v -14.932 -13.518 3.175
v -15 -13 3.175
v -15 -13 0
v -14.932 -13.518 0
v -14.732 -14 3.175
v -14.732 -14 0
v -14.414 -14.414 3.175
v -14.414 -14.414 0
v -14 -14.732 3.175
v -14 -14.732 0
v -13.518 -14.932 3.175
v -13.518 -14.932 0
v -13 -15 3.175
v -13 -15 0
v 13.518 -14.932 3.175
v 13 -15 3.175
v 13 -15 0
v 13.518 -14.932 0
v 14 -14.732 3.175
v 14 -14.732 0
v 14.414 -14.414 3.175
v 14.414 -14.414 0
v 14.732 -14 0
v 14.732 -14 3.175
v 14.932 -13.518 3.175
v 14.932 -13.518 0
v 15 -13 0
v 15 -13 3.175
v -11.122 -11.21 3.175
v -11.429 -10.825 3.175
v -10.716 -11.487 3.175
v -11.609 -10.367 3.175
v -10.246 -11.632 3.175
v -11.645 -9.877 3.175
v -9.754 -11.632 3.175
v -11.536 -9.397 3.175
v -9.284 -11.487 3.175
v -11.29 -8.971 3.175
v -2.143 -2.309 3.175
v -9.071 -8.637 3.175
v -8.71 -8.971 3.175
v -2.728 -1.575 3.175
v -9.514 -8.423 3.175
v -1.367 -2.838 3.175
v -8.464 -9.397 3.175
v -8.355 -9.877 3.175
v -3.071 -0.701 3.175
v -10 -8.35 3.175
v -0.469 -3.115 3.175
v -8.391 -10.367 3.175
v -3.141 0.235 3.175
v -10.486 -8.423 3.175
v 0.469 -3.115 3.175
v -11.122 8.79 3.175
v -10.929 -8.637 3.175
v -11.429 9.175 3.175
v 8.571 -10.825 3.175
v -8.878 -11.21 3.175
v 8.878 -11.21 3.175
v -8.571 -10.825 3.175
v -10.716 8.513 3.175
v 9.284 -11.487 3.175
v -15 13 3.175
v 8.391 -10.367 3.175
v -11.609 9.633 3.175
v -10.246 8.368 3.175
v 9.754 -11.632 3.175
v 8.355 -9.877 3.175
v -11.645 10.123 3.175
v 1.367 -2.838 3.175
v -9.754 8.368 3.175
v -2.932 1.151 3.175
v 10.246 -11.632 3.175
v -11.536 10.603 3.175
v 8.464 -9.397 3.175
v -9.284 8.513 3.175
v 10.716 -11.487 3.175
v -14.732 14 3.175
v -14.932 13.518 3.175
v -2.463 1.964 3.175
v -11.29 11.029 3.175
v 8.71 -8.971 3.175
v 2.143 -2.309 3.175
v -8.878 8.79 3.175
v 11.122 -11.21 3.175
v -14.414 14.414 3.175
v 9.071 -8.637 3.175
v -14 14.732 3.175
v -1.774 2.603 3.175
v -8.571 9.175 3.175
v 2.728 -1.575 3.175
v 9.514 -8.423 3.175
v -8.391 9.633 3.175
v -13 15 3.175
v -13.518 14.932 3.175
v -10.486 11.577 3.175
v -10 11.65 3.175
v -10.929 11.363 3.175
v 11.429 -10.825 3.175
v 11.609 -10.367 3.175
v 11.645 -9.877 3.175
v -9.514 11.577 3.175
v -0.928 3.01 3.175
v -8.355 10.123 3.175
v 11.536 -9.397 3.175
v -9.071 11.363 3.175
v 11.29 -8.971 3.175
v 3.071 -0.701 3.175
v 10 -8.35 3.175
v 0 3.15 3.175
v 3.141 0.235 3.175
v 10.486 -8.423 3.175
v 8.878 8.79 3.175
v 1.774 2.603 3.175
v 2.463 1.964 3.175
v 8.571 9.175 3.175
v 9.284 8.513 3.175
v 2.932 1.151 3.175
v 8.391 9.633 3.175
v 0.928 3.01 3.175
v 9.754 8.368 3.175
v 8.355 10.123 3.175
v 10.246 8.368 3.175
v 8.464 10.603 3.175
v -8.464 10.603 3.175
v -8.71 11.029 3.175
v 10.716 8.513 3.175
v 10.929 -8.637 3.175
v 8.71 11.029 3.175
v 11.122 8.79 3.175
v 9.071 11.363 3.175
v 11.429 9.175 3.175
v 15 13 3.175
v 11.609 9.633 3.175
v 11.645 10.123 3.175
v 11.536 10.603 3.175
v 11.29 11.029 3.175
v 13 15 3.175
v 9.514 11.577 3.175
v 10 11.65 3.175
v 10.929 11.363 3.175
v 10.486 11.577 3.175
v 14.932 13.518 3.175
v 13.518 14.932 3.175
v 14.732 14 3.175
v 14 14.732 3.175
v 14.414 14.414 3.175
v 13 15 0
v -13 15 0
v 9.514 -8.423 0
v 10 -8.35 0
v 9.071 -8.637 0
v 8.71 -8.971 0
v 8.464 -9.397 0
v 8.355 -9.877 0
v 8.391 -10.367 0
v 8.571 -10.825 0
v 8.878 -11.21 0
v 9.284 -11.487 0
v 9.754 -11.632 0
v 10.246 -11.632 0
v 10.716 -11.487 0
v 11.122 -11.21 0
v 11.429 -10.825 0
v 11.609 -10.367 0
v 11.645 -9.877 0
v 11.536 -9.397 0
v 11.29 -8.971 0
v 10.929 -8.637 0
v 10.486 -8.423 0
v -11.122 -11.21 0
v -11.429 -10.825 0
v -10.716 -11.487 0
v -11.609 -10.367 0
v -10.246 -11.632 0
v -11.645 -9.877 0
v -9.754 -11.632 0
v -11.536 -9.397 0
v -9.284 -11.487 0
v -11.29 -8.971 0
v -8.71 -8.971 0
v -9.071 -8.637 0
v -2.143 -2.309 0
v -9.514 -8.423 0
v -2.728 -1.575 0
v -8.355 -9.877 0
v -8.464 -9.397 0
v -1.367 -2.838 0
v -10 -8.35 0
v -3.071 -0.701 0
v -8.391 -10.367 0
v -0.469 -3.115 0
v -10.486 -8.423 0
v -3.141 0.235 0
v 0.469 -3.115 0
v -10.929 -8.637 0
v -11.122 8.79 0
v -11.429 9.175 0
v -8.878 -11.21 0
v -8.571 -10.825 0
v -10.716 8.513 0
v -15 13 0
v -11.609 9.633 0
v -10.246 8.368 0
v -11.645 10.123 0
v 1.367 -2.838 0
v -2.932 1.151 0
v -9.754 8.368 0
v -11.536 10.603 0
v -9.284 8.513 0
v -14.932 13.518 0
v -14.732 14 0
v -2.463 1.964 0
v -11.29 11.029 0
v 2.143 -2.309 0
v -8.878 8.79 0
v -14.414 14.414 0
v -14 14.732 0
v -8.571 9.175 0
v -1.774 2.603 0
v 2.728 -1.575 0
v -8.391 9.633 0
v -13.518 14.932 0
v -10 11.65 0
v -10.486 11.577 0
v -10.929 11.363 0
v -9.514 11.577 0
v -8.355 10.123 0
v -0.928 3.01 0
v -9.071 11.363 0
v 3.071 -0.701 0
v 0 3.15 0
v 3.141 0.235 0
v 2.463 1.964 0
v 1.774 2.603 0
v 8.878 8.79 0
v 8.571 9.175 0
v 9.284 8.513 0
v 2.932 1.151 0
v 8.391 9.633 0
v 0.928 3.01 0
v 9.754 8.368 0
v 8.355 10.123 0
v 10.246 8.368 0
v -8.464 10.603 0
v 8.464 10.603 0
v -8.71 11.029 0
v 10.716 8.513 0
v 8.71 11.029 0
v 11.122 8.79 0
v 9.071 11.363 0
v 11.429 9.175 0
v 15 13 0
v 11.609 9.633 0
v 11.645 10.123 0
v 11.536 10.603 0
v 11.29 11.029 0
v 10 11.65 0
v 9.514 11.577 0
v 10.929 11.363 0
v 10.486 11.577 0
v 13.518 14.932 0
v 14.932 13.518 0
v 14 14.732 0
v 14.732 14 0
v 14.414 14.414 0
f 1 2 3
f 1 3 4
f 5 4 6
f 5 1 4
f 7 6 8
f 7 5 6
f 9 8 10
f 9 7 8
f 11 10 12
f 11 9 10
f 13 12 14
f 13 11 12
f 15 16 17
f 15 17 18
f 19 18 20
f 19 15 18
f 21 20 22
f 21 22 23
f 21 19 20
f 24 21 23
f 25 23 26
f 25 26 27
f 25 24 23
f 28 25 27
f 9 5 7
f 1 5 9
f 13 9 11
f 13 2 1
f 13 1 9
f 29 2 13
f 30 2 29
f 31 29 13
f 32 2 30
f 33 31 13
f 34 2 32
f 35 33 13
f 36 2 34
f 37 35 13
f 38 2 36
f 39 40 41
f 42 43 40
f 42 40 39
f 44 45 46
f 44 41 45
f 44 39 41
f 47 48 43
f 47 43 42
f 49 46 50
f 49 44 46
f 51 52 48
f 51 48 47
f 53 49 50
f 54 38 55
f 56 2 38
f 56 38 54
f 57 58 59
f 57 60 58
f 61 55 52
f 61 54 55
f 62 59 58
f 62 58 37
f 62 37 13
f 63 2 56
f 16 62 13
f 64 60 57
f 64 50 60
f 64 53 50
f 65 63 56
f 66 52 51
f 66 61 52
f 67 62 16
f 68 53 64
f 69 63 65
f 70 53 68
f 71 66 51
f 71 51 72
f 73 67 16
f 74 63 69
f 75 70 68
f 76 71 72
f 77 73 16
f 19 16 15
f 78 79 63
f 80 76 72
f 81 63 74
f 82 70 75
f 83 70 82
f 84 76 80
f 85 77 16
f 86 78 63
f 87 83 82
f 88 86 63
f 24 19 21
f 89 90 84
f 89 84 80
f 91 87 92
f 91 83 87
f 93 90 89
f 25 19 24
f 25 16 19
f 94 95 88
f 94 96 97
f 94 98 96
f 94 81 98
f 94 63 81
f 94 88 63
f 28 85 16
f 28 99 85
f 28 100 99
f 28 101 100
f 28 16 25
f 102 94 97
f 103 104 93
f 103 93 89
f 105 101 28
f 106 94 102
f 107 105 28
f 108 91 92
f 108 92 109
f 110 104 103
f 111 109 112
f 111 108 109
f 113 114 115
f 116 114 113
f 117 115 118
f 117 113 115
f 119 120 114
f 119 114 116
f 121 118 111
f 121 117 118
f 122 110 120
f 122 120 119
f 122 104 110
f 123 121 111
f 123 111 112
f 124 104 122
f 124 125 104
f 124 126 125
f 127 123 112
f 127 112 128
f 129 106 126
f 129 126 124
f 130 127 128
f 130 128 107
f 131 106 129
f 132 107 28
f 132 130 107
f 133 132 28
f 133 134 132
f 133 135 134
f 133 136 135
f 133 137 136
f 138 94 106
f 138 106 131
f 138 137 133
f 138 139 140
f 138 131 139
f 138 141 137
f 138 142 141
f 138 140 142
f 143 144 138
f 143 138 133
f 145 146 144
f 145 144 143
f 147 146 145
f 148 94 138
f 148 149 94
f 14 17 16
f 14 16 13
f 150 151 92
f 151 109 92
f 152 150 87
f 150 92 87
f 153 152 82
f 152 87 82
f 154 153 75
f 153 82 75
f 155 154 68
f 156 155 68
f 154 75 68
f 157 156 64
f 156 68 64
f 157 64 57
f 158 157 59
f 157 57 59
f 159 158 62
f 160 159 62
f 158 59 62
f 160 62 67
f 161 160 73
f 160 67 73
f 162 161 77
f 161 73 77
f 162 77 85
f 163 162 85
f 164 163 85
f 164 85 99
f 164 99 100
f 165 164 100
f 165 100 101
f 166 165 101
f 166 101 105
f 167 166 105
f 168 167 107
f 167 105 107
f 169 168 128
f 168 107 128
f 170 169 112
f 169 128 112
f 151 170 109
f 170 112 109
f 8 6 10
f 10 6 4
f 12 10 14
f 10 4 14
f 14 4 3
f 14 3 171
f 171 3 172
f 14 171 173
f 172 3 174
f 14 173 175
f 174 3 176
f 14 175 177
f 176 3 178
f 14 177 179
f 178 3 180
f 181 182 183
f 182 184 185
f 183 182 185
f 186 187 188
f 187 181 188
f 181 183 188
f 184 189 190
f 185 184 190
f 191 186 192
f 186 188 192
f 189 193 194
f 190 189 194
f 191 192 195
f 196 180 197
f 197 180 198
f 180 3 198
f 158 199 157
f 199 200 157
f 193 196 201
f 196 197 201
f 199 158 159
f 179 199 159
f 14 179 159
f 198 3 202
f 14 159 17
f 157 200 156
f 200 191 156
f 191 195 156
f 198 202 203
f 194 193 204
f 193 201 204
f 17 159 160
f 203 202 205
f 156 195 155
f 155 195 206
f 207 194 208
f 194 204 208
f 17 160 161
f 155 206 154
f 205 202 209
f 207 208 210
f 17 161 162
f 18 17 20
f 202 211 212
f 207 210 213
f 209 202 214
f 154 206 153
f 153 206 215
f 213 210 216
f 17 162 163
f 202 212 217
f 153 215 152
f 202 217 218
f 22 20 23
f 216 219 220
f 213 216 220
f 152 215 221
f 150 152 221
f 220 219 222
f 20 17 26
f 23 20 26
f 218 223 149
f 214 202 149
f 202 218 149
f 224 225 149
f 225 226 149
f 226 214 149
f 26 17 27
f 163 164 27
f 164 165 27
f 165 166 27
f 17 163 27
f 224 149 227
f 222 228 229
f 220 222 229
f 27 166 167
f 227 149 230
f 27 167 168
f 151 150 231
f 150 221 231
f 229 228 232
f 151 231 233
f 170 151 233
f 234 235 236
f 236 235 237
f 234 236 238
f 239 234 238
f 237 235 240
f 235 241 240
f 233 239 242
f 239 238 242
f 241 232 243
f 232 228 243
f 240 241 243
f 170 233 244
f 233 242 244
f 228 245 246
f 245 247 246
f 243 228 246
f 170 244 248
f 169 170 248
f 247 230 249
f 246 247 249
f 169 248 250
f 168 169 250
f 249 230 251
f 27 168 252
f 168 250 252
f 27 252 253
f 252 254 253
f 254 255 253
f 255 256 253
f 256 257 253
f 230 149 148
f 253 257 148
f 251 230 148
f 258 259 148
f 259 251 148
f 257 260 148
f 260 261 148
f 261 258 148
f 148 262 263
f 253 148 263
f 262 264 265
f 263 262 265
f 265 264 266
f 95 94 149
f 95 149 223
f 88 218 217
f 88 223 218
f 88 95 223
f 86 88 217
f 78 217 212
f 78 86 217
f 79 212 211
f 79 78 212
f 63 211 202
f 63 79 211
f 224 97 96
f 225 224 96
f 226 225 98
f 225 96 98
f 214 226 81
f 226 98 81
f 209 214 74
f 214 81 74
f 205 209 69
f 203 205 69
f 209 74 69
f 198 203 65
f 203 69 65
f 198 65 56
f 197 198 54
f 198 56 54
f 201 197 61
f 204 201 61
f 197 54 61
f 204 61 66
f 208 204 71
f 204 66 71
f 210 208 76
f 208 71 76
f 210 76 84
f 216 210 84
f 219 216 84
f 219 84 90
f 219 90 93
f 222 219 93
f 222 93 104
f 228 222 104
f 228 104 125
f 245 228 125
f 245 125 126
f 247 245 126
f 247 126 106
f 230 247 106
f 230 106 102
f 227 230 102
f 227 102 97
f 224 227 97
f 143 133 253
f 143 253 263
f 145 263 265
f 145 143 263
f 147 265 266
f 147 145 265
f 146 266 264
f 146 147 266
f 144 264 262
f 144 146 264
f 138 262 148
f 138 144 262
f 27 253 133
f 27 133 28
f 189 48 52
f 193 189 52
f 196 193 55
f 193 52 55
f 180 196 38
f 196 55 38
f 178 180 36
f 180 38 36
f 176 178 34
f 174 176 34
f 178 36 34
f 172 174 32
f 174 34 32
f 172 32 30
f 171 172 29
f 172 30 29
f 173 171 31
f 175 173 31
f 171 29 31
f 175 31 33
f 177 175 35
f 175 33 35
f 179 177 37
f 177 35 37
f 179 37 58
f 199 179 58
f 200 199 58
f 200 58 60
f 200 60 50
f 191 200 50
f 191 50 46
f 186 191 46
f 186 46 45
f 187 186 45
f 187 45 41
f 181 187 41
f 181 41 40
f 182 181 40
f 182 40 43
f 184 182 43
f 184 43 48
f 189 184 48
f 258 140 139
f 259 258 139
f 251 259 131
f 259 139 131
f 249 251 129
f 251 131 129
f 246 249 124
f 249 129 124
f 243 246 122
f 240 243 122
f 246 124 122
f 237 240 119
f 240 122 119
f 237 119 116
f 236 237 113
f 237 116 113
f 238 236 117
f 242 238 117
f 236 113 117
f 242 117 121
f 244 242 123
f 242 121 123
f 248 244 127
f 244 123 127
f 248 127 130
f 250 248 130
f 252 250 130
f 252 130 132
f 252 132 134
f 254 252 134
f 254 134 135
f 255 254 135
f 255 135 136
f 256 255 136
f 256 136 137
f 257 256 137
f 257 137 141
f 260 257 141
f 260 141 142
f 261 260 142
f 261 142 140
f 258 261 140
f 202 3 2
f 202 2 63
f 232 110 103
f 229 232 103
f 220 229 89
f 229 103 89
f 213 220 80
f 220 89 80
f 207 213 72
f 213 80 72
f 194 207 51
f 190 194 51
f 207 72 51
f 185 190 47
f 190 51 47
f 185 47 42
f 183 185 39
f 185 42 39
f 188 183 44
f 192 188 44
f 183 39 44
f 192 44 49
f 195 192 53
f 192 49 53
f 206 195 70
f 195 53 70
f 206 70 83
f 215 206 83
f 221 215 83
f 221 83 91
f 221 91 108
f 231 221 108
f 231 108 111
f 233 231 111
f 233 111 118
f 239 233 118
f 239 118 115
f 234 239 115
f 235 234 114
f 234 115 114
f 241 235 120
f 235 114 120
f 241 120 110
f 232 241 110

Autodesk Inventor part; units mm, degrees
ref_plane "YZ Plane" through (0, 0, 0) normal (1, 0, 0) x (0, 1, 0)
ref_plane "XZ Plane" through (0, 0, 0) normal (0, 1, 0) x (-1, 0, 0)
ref_plane "XY Plane" through (0, 0, 0) normal (0, 0, 1) x (1, 0, 0)
sketch "Sketch1" plane through (0, 0, 0) normal (0, 0, 1) x (1, 0, 0)
  line L0 (10, -10) -> (-10, -10) construction
  line L1 (-10, -10) -> (-10, 10) construction
  line L2 (-10, 10) -> (10, 10) construction
  line L3 (10, 10) -> (10, -10) construction
  line L4 (10, -10) -> (-10, 10) construction
  line L5 (-10, -10) -> (10, 10) construction
  line L6 (15, -15) -> (-15, -15)
  line L7 (-15, -15) -> (-15, 15)
  line L8 (-15, 15) -> (15, 15)
  line L9 (15, 15) -> (15, -15)
  line L10 (15, -15) -> (-15, 15) construction
  line L11 (-15, -15) -> (15, 15) construction
  point P0 (0, 0)
  point P1 (0, 0)
  dimension "d0" = 20
  dimension "d1" = 20
  dimension "d2" = 30
  dimension "d3" = 30
extrude "Extrusion1" add sketch "Sketch1" along normal blind 3.175
fillet "Fillet1" radius 2 4 edges at (-15, 15, 1.5875) (-15, -15, 1.5875) (15, -15, 1.5875) (15, 15, 1.5875)
hole "Hole1" at (-10, 10, 0) at (10, 10, 0) at (10, -10, 0) at (-10, -10, 0) direction (0, 0, 1) diameter 3.3 end through all
hole "Hole2" at (0, 0, 0) direction (0, 0, 1) diameter 6.3 end through all
equation "\"d3\" = d2"
properties part number "Inductive Sensor Plate" material "Aluminum 6061"
